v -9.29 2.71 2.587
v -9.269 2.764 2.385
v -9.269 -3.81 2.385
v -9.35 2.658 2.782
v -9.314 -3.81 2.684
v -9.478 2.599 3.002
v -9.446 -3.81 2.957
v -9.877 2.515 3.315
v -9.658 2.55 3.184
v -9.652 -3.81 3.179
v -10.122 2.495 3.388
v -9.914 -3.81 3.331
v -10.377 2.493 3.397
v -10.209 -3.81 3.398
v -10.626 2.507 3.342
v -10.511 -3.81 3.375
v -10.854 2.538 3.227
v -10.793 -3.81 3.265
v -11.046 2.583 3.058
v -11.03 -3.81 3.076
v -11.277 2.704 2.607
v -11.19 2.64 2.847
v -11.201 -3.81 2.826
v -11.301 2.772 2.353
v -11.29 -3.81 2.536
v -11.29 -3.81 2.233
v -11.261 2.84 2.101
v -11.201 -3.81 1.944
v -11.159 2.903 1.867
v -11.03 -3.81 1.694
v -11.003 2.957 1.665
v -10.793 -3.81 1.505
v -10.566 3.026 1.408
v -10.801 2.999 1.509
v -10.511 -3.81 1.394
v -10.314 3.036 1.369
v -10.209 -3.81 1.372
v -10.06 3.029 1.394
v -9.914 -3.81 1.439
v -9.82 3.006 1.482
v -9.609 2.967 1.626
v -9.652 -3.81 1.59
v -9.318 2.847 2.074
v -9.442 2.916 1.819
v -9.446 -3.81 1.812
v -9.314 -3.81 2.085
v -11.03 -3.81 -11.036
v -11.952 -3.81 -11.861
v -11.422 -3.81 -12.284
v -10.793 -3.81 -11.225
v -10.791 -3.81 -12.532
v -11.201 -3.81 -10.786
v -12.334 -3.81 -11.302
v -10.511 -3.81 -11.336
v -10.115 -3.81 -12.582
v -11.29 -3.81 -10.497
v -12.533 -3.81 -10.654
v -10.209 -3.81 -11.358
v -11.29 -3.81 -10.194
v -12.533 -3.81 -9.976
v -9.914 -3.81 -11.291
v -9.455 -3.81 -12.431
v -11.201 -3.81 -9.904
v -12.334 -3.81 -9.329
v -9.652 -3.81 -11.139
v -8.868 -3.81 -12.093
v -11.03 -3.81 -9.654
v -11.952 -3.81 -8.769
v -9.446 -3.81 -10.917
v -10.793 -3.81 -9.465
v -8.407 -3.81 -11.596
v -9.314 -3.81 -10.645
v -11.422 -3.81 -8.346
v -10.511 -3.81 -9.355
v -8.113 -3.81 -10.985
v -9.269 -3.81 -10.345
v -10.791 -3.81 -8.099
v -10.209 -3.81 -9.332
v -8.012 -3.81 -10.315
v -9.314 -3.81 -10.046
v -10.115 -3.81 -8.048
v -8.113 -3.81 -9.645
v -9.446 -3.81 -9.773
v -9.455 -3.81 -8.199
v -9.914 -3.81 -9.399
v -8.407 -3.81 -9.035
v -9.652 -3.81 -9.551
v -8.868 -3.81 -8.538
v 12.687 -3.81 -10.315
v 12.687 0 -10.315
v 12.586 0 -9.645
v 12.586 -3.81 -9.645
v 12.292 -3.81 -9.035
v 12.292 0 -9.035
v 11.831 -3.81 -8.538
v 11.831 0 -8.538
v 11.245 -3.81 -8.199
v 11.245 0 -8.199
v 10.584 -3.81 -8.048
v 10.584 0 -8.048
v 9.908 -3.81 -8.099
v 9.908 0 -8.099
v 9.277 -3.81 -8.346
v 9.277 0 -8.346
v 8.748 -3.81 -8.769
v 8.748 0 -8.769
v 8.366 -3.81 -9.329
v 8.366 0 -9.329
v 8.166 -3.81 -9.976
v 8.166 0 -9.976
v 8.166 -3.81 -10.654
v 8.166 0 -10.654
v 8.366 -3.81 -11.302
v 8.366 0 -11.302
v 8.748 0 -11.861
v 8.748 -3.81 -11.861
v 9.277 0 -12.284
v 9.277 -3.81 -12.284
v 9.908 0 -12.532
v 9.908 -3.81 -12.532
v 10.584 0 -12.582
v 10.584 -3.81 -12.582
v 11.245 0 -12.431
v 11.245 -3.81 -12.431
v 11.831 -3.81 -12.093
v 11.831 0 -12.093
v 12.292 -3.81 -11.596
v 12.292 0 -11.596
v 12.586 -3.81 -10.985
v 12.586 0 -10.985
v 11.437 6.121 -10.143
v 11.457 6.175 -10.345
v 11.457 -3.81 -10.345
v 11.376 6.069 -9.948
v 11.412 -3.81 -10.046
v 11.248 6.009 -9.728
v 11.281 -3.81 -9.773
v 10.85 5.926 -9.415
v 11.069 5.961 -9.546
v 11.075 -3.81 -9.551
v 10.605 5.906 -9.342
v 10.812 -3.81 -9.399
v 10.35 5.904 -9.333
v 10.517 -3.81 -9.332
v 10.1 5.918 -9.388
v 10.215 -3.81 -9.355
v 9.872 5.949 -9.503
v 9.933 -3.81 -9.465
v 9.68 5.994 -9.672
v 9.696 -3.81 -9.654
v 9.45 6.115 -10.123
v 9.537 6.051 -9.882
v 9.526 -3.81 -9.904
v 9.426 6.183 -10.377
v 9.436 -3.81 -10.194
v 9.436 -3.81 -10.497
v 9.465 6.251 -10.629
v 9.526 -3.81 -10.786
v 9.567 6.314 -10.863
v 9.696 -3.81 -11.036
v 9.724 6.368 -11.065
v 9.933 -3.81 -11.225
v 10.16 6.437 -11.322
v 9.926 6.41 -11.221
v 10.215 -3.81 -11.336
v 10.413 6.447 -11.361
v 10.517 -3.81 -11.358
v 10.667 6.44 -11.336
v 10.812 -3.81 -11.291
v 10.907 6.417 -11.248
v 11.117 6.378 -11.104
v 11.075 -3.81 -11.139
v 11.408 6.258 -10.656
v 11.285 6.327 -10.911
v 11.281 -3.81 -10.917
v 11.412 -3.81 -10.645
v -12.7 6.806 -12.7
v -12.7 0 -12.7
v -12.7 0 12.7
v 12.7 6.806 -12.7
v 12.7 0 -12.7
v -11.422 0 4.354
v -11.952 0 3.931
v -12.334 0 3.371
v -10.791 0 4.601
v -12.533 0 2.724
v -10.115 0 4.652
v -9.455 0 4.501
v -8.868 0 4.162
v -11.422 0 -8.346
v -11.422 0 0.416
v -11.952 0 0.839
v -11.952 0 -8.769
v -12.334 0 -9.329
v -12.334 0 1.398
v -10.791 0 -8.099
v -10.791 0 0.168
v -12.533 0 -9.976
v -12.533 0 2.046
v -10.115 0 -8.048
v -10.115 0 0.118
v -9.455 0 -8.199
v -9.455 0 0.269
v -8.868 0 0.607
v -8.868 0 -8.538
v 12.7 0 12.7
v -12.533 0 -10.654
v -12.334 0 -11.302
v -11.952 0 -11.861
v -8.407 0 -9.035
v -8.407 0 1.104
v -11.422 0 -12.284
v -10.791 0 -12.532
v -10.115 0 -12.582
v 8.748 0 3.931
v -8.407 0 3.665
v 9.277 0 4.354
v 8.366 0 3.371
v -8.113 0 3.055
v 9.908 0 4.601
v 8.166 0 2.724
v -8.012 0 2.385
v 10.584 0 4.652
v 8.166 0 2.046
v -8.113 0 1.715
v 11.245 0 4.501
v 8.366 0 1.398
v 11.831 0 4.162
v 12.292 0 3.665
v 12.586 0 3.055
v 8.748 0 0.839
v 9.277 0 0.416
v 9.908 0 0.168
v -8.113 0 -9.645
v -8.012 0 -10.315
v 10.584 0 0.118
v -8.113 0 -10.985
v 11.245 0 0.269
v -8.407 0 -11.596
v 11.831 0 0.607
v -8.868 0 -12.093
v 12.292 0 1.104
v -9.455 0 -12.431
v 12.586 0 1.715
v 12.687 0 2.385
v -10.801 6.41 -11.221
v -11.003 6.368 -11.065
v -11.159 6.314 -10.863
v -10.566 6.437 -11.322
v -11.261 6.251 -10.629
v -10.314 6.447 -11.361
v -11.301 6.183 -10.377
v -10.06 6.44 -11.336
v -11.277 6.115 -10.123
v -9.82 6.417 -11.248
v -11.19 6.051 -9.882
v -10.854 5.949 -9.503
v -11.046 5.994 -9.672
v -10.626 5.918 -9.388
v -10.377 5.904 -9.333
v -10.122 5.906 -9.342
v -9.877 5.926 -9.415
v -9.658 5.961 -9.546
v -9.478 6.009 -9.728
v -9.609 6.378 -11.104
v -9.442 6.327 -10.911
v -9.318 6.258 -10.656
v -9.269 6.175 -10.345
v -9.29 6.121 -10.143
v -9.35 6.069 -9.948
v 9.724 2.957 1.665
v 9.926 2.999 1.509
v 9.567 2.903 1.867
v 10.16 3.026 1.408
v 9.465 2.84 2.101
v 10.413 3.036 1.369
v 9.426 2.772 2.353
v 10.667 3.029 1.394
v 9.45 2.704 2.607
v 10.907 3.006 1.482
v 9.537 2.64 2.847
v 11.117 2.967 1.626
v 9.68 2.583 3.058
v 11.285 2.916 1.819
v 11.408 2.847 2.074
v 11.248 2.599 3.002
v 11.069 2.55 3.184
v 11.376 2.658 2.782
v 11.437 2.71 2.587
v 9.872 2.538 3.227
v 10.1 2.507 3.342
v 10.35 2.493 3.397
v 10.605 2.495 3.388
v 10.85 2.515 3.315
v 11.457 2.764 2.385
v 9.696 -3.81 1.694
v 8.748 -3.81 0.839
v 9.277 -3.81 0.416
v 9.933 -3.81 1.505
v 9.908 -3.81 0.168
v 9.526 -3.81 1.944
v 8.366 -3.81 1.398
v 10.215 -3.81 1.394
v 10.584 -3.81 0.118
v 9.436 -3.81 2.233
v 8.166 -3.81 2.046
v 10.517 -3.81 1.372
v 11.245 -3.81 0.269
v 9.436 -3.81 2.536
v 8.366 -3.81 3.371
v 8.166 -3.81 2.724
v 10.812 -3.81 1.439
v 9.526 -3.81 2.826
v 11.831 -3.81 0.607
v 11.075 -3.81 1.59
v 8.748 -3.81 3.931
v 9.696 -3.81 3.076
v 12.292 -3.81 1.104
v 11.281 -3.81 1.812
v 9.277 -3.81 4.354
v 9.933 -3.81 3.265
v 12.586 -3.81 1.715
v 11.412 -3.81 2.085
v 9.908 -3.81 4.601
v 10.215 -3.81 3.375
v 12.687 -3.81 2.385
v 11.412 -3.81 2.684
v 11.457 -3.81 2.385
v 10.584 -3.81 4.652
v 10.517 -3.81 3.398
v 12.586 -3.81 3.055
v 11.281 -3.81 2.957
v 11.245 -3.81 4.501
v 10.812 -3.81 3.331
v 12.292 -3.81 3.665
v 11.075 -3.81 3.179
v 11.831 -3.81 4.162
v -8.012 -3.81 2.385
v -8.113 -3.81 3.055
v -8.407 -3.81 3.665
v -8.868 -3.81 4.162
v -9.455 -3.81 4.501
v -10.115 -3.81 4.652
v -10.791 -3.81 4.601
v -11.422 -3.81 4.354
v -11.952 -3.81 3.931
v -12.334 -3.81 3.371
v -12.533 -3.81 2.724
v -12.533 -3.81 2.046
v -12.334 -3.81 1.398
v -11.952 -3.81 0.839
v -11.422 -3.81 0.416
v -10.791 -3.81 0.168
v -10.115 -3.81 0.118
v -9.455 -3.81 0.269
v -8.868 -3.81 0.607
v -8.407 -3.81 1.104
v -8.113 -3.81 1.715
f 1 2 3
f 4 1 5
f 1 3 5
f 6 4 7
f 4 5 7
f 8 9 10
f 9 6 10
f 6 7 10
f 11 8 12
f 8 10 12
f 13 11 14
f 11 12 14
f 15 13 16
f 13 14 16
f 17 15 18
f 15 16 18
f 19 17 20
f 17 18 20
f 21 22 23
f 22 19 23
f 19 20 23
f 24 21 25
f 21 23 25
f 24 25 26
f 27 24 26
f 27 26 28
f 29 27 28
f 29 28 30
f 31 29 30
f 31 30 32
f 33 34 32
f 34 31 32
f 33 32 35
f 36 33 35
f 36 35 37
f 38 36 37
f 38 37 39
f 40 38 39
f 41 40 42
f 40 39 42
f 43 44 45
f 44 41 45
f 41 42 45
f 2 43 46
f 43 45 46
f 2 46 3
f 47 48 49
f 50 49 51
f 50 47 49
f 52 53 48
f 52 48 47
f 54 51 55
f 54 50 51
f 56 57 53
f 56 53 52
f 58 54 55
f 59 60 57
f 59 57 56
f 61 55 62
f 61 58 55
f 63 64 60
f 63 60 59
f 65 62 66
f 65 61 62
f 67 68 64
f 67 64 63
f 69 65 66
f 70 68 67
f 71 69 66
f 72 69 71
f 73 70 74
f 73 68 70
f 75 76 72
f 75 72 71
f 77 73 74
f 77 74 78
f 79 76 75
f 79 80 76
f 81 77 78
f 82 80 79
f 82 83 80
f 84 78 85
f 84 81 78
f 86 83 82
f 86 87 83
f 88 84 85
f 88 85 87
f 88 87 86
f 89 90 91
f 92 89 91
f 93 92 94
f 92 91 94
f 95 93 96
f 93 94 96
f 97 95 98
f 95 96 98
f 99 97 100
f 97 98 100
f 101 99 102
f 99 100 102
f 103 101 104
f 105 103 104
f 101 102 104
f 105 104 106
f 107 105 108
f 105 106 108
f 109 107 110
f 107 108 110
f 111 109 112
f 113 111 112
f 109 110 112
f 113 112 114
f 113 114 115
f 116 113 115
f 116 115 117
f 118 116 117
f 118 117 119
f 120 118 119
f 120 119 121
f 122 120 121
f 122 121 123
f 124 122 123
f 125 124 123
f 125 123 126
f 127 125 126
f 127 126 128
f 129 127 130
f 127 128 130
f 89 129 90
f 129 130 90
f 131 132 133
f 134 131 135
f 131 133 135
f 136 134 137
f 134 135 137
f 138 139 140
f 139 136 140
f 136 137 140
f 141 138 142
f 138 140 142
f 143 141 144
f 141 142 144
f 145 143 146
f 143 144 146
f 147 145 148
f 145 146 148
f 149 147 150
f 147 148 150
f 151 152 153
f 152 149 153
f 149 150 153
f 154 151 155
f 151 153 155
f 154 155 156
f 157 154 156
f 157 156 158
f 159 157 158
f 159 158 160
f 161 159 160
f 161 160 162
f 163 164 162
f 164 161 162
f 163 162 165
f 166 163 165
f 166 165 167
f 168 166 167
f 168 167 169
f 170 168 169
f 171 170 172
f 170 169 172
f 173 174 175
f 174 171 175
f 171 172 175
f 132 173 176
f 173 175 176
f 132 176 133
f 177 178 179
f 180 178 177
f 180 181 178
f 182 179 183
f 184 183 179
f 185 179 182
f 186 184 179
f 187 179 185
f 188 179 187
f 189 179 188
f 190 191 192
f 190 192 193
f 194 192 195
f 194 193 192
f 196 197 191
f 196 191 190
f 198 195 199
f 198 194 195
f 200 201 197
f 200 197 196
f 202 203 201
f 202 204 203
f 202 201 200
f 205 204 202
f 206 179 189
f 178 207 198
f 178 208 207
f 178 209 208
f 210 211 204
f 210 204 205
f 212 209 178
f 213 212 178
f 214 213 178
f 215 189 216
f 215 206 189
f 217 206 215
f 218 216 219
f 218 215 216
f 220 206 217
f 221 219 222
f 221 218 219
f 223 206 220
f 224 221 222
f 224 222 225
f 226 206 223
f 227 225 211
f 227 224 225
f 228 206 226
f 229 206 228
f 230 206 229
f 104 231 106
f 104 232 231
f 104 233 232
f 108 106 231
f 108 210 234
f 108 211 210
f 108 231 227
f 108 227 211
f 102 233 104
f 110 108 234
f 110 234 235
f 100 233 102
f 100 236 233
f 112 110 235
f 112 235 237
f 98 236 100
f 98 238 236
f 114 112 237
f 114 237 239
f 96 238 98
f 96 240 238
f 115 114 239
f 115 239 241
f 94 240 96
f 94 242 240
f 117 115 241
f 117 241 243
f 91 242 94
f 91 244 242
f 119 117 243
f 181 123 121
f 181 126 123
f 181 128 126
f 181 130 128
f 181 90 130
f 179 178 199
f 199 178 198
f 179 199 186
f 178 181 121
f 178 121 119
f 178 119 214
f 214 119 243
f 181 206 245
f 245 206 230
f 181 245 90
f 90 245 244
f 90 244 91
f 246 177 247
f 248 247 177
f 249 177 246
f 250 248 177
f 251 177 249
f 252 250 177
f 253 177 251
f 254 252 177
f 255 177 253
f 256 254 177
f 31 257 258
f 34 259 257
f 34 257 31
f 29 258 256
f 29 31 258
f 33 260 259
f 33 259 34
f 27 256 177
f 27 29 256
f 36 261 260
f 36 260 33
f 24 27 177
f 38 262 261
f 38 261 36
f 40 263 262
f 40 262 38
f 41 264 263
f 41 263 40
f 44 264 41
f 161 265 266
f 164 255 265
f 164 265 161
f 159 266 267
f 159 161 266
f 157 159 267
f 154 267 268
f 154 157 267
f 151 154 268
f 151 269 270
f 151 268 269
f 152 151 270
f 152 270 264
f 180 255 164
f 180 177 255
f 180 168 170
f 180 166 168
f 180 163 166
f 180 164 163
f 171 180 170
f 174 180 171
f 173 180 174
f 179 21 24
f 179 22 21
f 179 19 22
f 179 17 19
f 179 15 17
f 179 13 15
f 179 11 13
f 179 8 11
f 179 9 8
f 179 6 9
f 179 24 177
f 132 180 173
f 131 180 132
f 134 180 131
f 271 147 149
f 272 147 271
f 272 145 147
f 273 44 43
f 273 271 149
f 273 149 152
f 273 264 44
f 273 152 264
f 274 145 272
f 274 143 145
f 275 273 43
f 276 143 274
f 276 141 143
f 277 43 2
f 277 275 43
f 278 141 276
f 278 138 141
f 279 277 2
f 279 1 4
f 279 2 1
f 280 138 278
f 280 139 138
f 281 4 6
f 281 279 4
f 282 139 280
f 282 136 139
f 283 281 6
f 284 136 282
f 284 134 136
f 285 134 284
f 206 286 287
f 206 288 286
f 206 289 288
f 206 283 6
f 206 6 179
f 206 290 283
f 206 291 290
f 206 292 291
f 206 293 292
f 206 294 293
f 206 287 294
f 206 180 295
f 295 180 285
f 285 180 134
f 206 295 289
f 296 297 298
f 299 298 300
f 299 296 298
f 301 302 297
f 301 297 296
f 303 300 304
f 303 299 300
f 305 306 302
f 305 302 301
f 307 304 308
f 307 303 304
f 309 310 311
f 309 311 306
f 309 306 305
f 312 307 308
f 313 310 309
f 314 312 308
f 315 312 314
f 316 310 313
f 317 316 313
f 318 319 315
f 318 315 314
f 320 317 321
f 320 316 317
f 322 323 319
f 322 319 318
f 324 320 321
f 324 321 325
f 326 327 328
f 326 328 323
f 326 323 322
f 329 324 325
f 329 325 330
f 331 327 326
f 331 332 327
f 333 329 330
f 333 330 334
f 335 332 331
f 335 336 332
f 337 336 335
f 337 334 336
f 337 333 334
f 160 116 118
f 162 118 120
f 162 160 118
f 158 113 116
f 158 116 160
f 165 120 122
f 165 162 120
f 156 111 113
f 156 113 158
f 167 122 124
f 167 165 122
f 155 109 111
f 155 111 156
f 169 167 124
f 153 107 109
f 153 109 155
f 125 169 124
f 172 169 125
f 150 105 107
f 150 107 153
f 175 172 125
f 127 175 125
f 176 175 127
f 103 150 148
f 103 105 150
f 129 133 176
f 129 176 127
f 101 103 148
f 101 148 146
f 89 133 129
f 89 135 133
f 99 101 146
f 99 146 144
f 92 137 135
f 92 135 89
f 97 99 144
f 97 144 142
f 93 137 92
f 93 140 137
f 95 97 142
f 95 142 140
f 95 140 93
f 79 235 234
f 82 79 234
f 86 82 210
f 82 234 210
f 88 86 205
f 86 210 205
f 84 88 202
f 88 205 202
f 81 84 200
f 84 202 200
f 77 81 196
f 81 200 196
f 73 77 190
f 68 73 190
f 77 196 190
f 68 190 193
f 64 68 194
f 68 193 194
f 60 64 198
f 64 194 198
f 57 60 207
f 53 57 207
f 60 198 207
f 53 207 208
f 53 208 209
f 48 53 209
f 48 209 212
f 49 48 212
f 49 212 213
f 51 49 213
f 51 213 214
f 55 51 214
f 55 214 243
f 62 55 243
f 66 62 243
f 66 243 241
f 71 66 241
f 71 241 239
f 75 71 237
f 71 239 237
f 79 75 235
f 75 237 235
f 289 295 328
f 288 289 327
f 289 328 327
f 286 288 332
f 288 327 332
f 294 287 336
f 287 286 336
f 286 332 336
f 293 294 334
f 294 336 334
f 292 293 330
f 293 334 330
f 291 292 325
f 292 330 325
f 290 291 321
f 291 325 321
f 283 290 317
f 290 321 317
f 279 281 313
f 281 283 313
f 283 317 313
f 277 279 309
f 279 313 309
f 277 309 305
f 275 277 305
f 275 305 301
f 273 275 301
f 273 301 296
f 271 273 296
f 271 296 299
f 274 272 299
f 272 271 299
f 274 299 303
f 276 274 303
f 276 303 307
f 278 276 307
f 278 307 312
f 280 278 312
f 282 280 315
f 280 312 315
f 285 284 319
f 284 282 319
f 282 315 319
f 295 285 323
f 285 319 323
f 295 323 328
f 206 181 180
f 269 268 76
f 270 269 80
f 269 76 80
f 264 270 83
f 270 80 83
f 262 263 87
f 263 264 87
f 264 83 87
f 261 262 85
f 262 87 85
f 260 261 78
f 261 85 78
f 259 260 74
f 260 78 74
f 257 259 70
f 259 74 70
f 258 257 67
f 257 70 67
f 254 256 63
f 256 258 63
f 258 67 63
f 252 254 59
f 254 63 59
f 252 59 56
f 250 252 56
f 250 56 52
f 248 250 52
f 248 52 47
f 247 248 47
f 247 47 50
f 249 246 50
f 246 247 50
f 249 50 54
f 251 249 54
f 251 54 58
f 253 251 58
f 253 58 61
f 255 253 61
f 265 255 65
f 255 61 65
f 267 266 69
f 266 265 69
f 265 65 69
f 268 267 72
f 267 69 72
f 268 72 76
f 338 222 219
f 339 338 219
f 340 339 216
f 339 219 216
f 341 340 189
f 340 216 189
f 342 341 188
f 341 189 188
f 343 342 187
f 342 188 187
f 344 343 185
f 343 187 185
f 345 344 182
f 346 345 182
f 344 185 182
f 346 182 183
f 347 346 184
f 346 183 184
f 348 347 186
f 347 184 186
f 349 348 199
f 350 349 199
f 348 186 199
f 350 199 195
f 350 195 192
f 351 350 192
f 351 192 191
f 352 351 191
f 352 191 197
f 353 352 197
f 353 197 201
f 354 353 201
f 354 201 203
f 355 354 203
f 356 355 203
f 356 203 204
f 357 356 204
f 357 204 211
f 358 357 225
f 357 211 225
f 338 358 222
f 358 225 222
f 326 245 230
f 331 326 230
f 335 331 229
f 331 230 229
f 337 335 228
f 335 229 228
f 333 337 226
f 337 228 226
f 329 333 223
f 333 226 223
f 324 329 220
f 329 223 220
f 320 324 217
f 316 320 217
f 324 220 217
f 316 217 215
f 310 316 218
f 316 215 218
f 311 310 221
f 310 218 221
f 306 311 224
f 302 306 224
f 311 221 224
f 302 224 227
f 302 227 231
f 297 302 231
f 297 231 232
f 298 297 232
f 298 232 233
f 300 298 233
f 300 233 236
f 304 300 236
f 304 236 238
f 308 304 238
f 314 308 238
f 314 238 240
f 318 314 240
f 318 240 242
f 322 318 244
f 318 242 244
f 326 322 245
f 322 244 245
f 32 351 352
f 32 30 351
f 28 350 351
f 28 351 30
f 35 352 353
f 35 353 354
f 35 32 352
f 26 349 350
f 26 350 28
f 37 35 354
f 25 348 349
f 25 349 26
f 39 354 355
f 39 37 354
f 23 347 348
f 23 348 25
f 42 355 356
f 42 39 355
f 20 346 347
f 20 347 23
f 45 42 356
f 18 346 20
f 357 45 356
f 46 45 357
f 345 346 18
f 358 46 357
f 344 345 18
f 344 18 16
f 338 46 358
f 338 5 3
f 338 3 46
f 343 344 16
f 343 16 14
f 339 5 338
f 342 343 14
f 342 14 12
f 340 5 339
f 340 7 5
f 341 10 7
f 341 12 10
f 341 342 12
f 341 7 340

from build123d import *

# Parameters (mm, degrees)
F1_DEPTH = 12.7
F2_R     = 2.2733
F3_DEPTH = 3.81
F4_R     = 1.016
F5_DEPTH = 10.616909


with BuildPart() as f1:
    # F0 (on Right) → F1 (new body, symmetric)
    with BuildSketch(Plane.YZ):
        Polygon((6.805909, -12.7), (0, 12.7), (0, -12.7), align=None)
    extrude(amount=F1_DEPTH, both=True)

    # F2 (on face) → F3 (join)
    with BuildSketch(Plane.XZ):
        with Locations((-10.28534, -10.315215)):
            Circle(F2_R)
        with Locations((10.413997, -10.315215)):
            Circle(F2_R)
        with Locations((-10.28534, 2.384785)):
            Circle(F2_R)
        with Locations((10.413997, 2.384785)):
            Circle(F2_R)
    extrude(amount=F3_DEPTH)

    # F4 (on face) → F5 (cut, through all)
    with BuildSketch(Plane.XZ.offset(3.81)):
        with Locations((-10.28534, 2.384785)):
            Circle(F4_R)
        with Locations((-10.28534, -10.345133)):
            Circle(F4_R)
        with Locations((10.44106, 2.384785)):
            Circle(F4_R)
        with Locations((10.44106, -10.345133)):
            Circle(F4_R)
    extrude(amount=-F5_DEPTH, mode=Mode.SUBTRACT)


solid = f1.part
